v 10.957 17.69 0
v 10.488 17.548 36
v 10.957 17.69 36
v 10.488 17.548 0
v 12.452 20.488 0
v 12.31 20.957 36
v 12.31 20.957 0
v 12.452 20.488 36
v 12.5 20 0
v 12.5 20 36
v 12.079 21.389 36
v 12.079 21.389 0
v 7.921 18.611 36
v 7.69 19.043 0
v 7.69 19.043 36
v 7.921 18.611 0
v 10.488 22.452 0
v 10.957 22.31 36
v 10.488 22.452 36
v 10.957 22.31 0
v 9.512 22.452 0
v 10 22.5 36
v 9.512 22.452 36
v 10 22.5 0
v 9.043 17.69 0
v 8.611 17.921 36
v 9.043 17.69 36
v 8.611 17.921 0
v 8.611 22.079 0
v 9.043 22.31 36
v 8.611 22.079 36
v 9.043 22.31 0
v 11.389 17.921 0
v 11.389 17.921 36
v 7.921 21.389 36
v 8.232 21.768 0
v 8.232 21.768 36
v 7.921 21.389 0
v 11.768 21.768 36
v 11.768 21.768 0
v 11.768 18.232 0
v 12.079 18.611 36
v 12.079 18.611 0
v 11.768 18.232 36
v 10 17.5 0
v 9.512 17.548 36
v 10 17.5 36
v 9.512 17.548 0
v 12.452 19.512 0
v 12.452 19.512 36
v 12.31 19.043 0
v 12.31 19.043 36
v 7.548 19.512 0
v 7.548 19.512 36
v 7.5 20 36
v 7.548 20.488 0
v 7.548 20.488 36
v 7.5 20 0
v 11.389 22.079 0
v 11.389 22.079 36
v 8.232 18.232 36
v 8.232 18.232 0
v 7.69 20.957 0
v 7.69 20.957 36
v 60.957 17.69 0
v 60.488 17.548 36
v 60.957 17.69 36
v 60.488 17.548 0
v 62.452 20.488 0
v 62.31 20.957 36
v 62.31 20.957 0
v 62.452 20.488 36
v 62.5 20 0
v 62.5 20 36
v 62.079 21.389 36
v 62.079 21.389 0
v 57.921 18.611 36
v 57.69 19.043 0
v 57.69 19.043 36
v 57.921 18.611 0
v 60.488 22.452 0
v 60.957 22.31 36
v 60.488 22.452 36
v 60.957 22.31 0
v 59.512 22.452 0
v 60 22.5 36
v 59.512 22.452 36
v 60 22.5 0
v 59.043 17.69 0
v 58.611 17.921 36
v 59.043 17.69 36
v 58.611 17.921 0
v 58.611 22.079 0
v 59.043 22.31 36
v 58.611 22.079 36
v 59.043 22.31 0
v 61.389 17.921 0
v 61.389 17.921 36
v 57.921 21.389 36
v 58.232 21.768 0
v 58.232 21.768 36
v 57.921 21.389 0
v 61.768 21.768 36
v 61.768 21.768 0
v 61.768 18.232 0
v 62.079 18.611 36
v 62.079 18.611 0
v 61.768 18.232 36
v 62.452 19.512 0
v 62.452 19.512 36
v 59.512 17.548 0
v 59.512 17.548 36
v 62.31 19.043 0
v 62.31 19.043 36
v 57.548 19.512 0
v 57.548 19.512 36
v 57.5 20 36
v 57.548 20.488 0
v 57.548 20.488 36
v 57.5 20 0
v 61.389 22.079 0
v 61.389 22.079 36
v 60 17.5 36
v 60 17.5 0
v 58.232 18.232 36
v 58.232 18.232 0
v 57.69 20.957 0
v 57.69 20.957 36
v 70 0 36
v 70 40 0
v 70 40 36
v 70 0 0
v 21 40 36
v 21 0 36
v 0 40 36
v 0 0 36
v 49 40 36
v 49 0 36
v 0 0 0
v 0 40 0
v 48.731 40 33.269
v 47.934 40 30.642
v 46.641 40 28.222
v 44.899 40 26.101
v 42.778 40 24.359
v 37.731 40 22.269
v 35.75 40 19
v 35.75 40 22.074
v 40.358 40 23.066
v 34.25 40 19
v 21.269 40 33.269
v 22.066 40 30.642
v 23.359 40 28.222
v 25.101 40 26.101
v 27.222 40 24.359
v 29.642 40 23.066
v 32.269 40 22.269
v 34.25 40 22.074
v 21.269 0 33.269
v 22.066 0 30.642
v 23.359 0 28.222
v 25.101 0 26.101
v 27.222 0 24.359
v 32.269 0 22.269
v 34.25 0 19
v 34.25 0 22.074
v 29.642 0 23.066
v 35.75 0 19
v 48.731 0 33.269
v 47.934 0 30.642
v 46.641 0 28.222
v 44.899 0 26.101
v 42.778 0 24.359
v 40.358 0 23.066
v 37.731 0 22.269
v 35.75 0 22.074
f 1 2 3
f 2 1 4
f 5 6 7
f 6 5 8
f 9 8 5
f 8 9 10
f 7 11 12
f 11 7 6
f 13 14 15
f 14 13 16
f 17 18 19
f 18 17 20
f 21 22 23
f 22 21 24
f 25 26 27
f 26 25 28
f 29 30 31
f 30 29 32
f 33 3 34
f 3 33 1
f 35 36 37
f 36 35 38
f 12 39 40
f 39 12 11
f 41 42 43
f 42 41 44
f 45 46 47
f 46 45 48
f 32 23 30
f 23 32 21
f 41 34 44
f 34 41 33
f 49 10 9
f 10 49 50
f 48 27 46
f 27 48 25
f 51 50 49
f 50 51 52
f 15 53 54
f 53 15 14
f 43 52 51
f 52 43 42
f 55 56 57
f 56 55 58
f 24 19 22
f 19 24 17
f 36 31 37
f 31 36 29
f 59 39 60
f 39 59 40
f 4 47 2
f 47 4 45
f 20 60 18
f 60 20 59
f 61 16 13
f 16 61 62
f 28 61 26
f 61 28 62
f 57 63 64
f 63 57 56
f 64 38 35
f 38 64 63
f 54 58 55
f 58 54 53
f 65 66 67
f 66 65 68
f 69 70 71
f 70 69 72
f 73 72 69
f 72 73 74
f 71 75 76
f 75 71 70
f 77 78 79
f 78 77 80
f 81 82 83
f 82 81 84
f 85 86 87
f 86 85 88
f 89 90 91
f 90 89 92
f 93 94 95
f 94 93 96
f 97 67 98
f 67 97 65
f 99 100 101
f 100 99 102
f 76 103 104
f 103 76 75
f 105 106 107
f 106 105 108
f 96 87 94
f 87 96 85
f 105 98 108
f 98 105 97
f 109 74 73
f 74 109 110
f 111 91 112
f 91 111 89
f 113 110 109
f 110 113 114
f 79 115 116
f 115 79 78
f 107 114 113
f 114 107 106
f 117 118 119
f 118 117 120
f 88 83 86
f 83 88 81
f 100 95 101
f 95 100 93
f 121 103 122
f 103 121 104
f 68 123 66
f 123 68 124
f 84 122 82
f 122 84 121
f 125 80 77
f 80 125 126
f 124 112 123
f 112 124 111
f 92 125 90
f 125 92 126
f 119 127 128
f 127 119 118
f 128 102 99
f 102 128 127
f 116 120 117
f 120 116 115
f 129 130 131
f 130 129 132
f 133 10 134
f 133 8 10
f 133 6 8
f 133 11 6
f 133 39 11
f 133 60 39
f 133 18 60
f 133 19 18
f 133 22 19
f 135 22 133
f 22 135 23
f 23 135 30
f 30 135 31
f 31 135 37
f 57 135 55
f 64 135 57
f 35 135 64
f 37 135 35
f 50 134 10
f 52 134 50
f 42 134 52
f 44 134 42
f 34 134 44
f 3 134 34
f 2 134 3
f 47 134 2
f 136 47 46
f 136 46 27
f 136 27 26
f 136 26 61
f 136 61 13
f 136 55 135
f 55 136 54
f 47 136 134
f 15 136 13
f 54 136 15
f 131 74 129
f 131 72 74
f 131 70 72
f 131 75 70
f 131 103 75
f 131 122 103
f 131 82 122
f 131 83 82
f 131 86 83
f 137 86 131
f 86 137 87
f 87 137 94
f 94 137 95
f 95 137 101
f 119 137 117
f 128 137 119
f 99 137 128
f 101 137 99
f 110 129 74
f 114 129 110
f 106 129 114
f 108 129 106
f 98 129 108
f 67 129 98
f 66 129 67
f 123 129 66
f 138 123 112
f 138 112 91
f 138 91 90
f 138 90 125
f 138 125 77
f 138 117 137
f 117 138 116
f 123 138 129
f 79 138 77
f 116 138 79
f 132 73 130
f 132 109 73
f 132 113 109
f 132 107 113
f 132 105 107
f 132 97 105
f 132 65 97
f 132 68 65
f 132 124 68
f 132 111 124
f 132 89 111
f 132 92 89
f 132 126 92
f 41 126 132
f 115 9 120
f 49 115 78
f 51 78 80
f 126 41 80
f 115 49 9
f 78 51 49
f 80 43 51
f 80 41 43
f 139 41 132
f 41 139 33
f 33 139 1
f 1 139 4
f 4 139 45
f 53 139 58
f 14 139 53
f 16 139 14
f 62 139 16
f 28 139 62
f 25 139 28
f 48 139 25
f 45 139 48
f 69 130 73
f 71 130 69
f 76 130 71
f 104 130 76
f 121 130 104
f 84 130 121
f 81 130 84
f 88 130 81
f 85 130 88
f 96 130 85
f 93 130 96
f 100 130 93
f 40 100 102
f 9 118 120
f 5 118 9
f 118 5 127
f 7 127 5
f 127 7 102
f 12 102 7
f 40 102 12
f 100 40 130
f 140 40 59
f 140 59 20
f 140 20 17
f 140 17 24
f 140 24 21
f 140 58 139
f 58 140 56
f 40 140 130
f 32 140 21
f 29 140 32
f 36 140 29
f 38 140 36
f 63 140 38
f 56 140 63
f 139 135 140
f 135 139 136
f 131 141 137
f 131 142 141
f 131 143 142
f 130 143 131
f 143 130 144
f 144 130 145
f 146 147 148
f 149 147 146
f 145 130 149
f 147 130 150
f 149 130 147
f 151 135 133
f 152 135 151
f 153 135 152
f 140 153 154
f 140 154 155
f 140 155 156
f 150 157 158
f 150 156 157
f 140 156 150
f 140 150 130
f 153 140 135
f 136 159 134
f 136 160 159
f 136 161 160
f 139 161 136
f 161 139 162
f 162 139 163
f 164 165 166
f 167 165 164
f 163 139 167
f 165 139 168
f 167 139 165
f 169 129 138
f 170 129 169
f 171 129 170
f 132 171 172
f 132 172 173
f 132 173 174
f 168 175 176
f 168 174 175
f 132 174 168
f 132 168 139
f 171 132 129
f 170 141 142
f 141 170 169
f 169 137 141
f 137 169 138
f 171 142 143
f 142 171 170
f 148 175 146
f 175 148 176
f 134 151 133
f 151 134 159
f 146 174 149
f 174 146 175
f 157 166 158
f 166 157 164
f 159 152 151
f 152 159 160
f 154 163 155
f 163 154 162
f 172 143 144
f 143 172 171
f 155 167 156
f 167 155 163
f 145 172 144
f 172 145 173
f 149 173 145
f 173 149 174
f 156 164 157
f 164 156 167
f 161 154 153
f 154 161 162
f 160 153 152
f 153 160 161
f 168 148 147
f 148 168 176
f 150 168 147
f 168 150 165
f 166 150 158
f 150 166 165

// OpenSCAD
$fn = 32;

// ----------------------------------------------------------------------
// Saddle clamp: split shaft clamp
// ----------------------------------------------------------------------

// --- parameters (mm) ---
blk_l = 70;               // block length, X
blk_w = 40;               // block width, Y
blk_h = 36;               // block height
clamp_r = 14;             // shaft groove radius
hole_r = 2.5;             // bolt hole radius
hole_m = 10;              // bolt hole margin from the ends
saw_w = 1.5;              // saw kerf width
fit_tol = 0.02;           // tolerance for press fits, mm
free_tol = 0.2;           // tolerance for clearance fits, mm

saw_depth = clamp_r + 3;  // saw kerf depth

difference() {
  cube([blk_l, blk_w, blk_h]);
  translate([blk_l / 2, -1, blk_h])
    rotate([-90, 0, 0])
      cylinder(h = blk_w + 2, r = clamp_r);
  for (sx = [0, 1])
    translate([sx ? blk_l - hole_m : hole_m, blk_w / 2, -1])
      cylinder(r = hole_r, h = blk_h + 2);
  translate([blk_l / 2 - saw_w / 2, -1, blk_h - saw_depth])
    cube([saw_w, blk_w + 2, saw_depth + 1]);
}
